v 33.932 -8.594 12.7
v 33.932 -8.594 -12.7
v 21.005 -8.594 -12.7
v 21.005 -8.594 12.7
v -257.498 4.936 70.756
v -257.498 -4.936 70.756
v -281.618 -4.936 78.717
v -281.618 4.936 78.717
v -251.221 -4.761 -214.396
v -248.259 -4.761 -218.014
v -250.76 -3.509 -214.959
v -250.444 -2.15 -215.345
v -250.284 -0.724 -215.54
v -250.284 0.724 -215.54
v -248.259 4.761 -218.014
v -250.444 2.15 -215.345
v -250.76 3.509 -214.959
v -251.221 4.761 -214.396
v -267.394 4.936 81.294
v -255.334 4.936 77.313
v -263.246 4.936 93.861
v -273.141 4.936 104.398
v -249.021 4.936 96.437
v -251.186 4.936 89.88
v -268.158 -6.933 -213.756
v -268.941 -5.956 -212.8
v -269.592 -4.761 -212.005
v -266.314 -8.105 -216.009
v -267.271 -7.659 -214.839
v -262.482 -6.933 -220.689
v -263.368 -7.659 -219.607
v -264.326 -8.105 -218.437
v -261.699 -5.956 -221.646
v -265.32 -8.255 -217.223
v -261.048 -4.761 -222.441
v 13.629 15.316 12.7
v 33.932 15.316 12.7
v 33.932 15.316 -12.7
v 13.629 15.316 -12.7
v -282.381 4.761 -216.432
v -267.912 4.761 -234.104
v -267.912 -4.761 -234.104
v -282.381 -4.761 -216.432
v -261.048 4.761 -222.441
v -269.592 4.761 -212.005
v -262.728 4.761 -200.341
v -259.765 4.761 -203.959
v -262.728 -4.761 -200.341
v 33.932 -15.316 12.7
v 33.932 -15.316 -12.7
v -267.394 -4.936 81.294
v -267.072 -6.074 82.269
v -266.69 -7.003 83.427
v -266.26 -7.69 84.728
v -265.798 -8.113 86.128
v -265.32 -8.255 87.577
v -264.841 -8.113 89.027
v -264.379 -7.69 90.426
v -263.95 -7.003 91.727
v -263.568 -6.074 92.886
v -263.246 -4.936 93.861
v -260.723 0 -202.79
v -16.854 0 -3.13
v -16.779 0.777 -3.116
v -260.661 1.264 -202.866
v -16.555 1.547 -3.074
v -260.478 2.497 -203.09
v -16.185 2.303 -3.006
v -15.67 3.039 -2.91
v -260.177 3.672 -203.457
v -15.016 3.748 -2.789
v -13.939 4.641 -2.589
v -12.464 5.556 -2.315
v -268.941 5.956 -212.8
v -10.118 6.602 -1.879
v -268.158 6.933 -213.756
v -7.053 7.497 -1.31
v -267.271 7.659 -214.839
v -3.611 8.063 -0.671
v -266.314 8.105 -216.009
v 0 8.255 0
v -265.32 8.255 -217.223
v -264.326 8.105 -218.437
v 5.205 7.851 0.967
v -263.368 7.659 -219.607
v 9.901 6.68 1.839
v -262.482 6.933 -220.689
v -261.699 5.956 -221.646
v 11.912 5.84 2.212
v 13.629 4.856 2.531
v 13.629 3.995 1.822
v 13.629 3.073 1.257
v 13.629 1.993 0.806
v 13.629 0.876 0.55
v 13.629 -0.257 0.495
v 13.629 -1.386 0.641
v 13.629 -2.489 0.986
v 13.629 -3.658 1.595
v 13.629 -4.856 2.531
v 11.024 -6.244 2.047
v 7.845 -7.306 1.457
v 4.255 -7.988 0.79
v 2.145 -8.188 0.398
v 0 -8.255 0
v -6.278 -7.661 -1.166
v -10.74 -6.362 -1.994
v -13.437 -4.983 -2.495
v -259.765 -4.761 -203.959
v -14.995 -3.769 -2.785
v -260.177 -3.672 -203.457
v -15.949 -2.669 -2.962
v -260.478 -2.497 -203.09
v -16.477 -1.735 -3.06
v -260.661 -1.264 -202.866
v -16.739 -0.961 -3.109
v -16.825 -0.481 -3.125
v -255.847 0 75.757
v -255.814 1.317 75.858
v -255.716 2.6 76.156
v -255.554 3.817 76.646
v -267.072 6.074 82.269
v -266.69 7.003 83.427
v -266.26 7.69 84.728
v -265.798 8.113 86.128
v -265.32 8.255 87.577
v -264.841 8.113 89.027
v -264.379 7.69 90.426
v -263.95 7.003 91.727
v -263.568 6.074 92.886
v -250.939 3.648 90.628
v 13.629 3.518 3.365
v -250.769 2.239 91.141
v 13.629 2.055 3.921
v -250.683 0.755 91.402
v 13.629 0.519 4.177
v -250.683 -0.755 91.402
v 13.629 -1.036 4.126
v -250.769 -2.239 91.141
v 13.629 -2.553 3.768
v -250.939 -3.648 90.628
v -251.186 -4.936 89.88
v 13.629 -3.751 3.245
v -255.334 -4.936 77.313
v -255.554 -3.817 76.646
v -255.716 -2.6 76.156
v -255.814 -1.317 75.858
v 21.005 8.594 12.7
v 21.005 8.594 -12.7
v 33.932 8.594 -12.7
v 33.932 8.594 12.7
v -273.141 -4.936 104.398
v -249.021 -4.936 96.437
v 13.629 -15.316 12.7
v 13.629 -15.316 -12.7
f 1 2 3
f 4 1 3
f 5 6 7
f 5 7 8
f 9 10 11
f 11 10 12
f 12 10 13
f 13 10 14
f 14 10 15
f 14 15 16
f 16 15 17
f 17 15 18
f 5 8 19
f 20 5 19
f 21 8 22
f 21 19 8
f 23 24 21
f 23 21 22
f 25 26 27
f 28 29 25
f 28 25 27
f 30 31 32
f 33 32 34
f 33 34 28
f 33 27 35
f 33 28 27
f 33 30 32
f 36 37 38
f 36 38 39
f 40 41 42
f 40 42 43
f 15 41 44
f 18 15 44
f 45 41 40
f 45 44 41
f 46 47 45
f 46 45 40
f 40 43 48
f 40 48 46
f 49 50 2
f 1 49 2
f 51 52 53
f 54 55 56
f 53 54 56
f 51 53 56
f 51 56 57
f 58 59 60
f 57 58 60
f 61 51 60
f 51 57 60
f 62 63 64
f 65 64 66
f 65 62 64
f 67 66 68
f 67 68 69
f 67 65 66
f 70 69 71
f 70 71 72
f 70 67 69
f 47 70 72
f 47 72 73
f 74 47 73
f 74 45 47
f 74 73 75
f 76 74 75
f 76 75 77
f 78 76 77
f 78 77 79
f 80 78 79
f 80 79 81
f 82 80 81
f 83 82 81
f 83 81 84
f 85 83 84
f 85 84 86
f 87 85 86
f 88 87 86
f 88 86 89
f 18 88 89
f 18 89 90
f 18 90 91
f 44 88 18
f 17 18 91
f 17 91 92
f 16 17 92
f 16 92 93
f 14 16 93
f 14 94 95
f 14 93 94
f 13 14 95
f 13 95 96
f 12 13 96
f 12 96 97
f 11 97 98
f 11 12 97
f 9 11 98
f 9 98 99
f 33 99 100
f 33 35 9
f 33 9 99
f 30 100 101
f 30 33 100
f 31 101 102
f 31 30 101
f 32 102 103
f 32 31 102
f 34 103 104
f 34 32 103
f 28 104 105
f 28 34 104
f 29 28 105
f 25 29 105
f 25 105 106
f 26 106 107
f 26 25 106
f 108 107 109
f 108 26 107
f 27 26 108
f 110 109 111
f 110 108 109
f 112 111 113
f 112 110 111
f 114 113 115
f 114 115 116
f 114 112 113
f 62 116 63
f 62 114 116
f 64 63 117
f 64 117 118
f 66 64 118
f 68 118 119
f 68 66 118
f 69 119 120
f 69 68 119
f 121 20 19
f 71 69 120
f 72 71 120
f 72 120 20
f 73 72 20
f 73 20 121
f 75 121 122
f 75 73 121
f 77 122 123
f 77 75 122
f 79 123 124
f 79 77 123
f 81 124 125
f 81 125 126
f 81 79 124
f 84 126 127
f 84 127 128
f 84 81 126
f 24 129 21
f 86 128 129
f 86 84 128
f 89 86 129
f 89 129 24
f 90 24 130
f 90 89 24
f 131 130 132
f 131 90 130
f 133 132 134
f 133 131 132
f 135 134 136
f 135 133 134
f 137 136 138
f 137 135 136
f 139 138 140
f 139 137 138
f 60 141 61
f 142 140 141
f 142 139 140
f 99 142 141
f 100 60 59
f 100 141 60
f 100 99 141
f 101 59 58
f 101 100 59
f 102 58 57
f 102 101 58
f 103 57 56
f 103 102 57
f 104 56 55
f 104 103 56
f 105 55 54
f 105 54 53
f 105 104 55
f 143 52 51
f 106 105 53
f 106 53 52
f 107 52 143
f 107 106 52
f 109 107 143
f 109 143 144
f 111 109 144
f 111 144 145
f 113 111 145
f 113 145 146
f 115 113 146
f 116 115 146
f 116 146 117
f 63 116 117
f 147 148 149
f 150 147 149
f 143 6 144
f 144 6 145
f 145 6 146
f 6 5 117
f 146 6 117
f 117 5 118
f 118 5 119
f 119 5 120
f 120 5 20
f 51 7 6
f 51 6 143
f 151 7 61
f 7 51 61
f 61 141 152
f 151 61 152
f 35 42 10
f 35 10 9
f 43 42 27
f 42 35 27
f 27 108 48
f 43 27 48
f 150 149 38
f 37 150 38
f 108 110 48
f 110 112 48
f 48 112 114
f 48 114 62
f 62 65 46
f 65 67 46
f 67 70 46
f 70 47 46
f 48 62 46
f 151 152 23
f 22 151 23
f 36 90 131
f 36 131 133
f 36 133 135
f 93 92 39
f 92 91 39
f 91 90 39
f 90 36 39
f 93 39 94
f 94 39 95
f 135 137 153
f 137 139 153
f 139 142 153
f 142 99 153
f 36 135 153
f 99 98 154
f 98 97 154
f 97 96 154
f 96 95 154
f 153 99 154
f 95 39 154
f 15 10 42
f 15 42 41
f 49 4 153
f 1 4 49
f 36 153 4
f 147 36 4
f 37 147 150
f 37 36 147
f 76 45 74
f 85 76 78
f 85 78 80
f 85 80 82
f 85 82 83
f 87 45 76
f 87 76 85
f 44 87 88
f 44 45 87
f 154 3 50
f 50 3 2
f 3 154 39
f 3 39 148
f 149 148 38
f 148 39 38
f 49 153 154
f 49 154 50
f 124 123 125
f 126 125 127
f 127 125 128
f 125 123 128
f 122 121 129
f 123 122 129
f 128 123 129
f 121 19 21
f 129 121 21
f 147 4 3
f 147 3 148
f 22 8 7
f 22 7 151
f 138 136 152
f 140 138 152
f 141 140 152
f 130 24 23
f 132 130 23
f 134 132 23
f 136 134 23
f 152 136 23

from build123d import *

# Parameters (mm, degrees)
SKETCH2_R                = 8.255
BOSS_EXTRUDE1_DEPTH      = 12.7
BOSS_EXTRUDE1_DEPTH_BACK = 12.7
BOSS_EXTRUDE2_DEPTH      = 12.7
BOSS_EXTRUDE2_DEPTH_BACK = 12.7
SKETCH4_W                = 27.044091096
SKETCH4_H                = 9.871476176
BOSS_EXTRUDE3_DEPTH      = 12.7
BOSS_EXTRUDE3_DEPTH_BACK = 12.7
SKETCH5_W                = 22.839690924
SKETCH5_H                = 9.521004572


with BuildPart() as part:
    # Sweep1: sweep along a path in Sketch1
    with BuildLine(Plane(origin=(0, 0, 0), x_dir=(1, 0, 0), z_dir=(0, 1, 0))) as sweep1_path:
        Line((-265.319834303, -87.577083333), (0, 0))
        Line((0, 0), (-265.319834303, 217.222916667))
    # Sketch2 → Sweep1 (sweep)
    with BuildSketch(Plane(origin=(-265.319834303, 0, 87.577083333), x_dir=(-0.3134469696969697, 0, -0.949605706168506), z_dir=(0.949605706168506, 0, -0.3134469696969697))):
        Circle(SKETCH2_R)
    sweep(path=sweep1_path.line, transition=Transition.RIGHT)

    # Sketch3 → Boss-Extrude1 (add, two sides: drawn at the far end of the back side and taken through both)
    with BuildSketch(Plane.XY.offset(-BOSS_EXTRUDE1_DEPTH_BACK)):
        Polygon((33.931753368, 15.31554454), (13.629365652, 15.31554454), (13.629365652, -15.31554454), (33.931753368, -15.31554454), (33.931753368, -8.593796811), (21.004584429, -8.593796811), (21.004584429, 8.593796811), (33.931753368, 8.593796811), align=None)
    extrude(amount=BOSS_EXTRUDE1_DEPTH + BOSS_EXTRUDE1_DEPTH_BACK)

    # Sketch4 → Boss-Extrude2 (add, two sides: drawn at the far end of the back side and taken through both)
    with BuildSketch(Plane(origin=(-265.319834303, 0, 87.577083333), x_dir=(0.3134469696969697, 0, 0.949605706168506), z_dir=(-0.949605706168506, 0, 0.3134469696969697)).offset(-BOSS_EXTRUDE2_DEPTH_BACK)):
        Rectangle(SKETCH4_W, SKETCH4_H)
    extrude(amount=BOSS_EXTRUDE2_DEPTH + BOSS_EXTRUDE2_DEPTH_BACK)

    # Sketch5 → Boss-Extrude3 (add, two sides: drawn at the far end of the back side and taken through both)
    with BuildSketch(Plane(origin=(-265.319834303, 0, -217.222916667), x_dir=(-0.633487654320988, 0, 0.7737527976187824), z_dir=(-0.7737527976187824, 0, -0.633487654320988)).offset(-BOSS_EXTRUDE3_DEPTH_BACK)):
        Rectangle(SKETCH5_W, SKETCH5_H)
    extrude(amount=BOSS_EXTRUDE3_DEPTH + BOSS_EXTRUDE3_DEPTH_BACK)


solid = part.part
